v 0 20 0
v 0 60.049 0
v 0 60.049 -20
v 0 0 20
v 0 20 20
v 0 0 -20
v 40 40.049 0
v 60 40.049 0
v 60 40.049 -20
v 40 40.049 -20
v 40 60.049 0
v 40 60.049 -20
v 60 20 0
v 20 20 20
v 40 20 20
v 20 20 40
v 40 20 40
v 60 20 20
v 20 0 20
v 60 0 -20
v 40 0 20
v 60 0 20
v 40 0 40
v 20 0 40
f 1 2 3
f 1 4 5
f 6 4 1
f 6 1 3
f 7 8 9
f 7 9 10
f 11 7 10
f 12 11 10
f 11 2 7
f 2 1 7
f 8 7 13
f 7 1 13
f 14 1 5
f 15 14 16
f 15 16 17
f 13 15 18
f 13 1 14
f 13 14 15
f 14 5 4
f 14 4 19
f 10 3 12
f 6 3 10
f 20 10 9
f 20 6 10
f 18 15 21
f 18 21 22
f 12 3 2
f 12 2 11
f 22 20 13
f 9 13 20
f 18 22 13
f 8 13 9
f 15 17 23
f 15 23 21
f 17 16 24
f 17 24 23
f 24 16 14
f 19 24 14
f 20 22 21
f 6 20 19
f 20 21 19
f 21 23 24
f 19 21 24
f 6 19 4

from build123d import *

# Parameters (mm, degrees)
ESBO_O2_W                = 60
ESBO_O2_H                = 20
RESSALTO_EXTRUS_O1_DEPTH = 40
ESBO_O4_W                = 20
ESBO_O4_H                = 20
CORTE_EXTRUS_O1_DEPTH    = 40
ESBO_O5_W                = 20
ESBO_O5_H                = 20
CORTE_EXTRUS_O2_DEPTH    = 40
ESBO_O7_W                = 60
ESBO_O7_H                = 40.049473908
RESSALTO_EXTRUS_O2_DEPTH = 20
ESBO_O8_W                = 40
ESBO_O8_H                = 20
RESSALTO_EXTRUS_O3_DEPTH = 20


with BuildPart() as part:
    # Esboço2 → Ressalto-extrusão1 (new body)
    with BuildSketch(Plane.XY):
        with Locations((30, 10)):
            Rectangle(ESBO_O2_W, ESBO_O2_H)
    extrude(amount=RESSALTO_EXTRUS_O1_DEPTH)

    # Esboço4 → Corte-extrusão1 (cut)
    with BuildSketch(Plane(origin=(0, 20, 0), x_dir=(1, 0, 0), z_dir=(0, 1, 0))):
        with Locations((10, -30)):
            Rectangle(ESBO_O4_W, ESBO_O4_H)
    extrude(amount=-CORTE_EXTRUS_O1_DEPTH, mode=Mode.SUBTRACT)

    # Esboço5 → Corte-extrusão2 (cut)
    with BuildSketch(Plane(origin=(0, 20, 0), x_dir=(1, 0, 0), z_dir=(0, 1, 0))):
        with Locations((50, -30)):
            Rectangle(ESBO_O5_W, ESBO_O5_H)
    extrude(amount=-CORTE_EXTRUS_O2_DEPTH, mode=Mode.SUBTRACT)

    # Esboço7 → Ressalto-extrusão2 (add)
    with BuildSketch(Plane(origin=(0, 0, 0), x_dir=(-1, 0, 0), z_dir=(0, 0, -1))):
        with Locations((-30, 20.024736954)):
            Rectangle(ESBO_O7_W, ESBO_O7_H)
    extrude(amount=RESSALTO_EXTRUS_O2_DEPTH)

    # Esboço8 → Ressalto-extrusão3 (add)
    with BuildSketch(Plane(origin=(0, 40.049473908, 0), x_dir=(1, 0, 0), z_dir=(0, 1, 0))):
        with Locations((20, 10)):
            Rectangle(ESBO_O8_W, ESBO_O8_H)
    extrude(amount=RESSALTO_EXTRUS_O3_DEPTH)


solid = part.part
